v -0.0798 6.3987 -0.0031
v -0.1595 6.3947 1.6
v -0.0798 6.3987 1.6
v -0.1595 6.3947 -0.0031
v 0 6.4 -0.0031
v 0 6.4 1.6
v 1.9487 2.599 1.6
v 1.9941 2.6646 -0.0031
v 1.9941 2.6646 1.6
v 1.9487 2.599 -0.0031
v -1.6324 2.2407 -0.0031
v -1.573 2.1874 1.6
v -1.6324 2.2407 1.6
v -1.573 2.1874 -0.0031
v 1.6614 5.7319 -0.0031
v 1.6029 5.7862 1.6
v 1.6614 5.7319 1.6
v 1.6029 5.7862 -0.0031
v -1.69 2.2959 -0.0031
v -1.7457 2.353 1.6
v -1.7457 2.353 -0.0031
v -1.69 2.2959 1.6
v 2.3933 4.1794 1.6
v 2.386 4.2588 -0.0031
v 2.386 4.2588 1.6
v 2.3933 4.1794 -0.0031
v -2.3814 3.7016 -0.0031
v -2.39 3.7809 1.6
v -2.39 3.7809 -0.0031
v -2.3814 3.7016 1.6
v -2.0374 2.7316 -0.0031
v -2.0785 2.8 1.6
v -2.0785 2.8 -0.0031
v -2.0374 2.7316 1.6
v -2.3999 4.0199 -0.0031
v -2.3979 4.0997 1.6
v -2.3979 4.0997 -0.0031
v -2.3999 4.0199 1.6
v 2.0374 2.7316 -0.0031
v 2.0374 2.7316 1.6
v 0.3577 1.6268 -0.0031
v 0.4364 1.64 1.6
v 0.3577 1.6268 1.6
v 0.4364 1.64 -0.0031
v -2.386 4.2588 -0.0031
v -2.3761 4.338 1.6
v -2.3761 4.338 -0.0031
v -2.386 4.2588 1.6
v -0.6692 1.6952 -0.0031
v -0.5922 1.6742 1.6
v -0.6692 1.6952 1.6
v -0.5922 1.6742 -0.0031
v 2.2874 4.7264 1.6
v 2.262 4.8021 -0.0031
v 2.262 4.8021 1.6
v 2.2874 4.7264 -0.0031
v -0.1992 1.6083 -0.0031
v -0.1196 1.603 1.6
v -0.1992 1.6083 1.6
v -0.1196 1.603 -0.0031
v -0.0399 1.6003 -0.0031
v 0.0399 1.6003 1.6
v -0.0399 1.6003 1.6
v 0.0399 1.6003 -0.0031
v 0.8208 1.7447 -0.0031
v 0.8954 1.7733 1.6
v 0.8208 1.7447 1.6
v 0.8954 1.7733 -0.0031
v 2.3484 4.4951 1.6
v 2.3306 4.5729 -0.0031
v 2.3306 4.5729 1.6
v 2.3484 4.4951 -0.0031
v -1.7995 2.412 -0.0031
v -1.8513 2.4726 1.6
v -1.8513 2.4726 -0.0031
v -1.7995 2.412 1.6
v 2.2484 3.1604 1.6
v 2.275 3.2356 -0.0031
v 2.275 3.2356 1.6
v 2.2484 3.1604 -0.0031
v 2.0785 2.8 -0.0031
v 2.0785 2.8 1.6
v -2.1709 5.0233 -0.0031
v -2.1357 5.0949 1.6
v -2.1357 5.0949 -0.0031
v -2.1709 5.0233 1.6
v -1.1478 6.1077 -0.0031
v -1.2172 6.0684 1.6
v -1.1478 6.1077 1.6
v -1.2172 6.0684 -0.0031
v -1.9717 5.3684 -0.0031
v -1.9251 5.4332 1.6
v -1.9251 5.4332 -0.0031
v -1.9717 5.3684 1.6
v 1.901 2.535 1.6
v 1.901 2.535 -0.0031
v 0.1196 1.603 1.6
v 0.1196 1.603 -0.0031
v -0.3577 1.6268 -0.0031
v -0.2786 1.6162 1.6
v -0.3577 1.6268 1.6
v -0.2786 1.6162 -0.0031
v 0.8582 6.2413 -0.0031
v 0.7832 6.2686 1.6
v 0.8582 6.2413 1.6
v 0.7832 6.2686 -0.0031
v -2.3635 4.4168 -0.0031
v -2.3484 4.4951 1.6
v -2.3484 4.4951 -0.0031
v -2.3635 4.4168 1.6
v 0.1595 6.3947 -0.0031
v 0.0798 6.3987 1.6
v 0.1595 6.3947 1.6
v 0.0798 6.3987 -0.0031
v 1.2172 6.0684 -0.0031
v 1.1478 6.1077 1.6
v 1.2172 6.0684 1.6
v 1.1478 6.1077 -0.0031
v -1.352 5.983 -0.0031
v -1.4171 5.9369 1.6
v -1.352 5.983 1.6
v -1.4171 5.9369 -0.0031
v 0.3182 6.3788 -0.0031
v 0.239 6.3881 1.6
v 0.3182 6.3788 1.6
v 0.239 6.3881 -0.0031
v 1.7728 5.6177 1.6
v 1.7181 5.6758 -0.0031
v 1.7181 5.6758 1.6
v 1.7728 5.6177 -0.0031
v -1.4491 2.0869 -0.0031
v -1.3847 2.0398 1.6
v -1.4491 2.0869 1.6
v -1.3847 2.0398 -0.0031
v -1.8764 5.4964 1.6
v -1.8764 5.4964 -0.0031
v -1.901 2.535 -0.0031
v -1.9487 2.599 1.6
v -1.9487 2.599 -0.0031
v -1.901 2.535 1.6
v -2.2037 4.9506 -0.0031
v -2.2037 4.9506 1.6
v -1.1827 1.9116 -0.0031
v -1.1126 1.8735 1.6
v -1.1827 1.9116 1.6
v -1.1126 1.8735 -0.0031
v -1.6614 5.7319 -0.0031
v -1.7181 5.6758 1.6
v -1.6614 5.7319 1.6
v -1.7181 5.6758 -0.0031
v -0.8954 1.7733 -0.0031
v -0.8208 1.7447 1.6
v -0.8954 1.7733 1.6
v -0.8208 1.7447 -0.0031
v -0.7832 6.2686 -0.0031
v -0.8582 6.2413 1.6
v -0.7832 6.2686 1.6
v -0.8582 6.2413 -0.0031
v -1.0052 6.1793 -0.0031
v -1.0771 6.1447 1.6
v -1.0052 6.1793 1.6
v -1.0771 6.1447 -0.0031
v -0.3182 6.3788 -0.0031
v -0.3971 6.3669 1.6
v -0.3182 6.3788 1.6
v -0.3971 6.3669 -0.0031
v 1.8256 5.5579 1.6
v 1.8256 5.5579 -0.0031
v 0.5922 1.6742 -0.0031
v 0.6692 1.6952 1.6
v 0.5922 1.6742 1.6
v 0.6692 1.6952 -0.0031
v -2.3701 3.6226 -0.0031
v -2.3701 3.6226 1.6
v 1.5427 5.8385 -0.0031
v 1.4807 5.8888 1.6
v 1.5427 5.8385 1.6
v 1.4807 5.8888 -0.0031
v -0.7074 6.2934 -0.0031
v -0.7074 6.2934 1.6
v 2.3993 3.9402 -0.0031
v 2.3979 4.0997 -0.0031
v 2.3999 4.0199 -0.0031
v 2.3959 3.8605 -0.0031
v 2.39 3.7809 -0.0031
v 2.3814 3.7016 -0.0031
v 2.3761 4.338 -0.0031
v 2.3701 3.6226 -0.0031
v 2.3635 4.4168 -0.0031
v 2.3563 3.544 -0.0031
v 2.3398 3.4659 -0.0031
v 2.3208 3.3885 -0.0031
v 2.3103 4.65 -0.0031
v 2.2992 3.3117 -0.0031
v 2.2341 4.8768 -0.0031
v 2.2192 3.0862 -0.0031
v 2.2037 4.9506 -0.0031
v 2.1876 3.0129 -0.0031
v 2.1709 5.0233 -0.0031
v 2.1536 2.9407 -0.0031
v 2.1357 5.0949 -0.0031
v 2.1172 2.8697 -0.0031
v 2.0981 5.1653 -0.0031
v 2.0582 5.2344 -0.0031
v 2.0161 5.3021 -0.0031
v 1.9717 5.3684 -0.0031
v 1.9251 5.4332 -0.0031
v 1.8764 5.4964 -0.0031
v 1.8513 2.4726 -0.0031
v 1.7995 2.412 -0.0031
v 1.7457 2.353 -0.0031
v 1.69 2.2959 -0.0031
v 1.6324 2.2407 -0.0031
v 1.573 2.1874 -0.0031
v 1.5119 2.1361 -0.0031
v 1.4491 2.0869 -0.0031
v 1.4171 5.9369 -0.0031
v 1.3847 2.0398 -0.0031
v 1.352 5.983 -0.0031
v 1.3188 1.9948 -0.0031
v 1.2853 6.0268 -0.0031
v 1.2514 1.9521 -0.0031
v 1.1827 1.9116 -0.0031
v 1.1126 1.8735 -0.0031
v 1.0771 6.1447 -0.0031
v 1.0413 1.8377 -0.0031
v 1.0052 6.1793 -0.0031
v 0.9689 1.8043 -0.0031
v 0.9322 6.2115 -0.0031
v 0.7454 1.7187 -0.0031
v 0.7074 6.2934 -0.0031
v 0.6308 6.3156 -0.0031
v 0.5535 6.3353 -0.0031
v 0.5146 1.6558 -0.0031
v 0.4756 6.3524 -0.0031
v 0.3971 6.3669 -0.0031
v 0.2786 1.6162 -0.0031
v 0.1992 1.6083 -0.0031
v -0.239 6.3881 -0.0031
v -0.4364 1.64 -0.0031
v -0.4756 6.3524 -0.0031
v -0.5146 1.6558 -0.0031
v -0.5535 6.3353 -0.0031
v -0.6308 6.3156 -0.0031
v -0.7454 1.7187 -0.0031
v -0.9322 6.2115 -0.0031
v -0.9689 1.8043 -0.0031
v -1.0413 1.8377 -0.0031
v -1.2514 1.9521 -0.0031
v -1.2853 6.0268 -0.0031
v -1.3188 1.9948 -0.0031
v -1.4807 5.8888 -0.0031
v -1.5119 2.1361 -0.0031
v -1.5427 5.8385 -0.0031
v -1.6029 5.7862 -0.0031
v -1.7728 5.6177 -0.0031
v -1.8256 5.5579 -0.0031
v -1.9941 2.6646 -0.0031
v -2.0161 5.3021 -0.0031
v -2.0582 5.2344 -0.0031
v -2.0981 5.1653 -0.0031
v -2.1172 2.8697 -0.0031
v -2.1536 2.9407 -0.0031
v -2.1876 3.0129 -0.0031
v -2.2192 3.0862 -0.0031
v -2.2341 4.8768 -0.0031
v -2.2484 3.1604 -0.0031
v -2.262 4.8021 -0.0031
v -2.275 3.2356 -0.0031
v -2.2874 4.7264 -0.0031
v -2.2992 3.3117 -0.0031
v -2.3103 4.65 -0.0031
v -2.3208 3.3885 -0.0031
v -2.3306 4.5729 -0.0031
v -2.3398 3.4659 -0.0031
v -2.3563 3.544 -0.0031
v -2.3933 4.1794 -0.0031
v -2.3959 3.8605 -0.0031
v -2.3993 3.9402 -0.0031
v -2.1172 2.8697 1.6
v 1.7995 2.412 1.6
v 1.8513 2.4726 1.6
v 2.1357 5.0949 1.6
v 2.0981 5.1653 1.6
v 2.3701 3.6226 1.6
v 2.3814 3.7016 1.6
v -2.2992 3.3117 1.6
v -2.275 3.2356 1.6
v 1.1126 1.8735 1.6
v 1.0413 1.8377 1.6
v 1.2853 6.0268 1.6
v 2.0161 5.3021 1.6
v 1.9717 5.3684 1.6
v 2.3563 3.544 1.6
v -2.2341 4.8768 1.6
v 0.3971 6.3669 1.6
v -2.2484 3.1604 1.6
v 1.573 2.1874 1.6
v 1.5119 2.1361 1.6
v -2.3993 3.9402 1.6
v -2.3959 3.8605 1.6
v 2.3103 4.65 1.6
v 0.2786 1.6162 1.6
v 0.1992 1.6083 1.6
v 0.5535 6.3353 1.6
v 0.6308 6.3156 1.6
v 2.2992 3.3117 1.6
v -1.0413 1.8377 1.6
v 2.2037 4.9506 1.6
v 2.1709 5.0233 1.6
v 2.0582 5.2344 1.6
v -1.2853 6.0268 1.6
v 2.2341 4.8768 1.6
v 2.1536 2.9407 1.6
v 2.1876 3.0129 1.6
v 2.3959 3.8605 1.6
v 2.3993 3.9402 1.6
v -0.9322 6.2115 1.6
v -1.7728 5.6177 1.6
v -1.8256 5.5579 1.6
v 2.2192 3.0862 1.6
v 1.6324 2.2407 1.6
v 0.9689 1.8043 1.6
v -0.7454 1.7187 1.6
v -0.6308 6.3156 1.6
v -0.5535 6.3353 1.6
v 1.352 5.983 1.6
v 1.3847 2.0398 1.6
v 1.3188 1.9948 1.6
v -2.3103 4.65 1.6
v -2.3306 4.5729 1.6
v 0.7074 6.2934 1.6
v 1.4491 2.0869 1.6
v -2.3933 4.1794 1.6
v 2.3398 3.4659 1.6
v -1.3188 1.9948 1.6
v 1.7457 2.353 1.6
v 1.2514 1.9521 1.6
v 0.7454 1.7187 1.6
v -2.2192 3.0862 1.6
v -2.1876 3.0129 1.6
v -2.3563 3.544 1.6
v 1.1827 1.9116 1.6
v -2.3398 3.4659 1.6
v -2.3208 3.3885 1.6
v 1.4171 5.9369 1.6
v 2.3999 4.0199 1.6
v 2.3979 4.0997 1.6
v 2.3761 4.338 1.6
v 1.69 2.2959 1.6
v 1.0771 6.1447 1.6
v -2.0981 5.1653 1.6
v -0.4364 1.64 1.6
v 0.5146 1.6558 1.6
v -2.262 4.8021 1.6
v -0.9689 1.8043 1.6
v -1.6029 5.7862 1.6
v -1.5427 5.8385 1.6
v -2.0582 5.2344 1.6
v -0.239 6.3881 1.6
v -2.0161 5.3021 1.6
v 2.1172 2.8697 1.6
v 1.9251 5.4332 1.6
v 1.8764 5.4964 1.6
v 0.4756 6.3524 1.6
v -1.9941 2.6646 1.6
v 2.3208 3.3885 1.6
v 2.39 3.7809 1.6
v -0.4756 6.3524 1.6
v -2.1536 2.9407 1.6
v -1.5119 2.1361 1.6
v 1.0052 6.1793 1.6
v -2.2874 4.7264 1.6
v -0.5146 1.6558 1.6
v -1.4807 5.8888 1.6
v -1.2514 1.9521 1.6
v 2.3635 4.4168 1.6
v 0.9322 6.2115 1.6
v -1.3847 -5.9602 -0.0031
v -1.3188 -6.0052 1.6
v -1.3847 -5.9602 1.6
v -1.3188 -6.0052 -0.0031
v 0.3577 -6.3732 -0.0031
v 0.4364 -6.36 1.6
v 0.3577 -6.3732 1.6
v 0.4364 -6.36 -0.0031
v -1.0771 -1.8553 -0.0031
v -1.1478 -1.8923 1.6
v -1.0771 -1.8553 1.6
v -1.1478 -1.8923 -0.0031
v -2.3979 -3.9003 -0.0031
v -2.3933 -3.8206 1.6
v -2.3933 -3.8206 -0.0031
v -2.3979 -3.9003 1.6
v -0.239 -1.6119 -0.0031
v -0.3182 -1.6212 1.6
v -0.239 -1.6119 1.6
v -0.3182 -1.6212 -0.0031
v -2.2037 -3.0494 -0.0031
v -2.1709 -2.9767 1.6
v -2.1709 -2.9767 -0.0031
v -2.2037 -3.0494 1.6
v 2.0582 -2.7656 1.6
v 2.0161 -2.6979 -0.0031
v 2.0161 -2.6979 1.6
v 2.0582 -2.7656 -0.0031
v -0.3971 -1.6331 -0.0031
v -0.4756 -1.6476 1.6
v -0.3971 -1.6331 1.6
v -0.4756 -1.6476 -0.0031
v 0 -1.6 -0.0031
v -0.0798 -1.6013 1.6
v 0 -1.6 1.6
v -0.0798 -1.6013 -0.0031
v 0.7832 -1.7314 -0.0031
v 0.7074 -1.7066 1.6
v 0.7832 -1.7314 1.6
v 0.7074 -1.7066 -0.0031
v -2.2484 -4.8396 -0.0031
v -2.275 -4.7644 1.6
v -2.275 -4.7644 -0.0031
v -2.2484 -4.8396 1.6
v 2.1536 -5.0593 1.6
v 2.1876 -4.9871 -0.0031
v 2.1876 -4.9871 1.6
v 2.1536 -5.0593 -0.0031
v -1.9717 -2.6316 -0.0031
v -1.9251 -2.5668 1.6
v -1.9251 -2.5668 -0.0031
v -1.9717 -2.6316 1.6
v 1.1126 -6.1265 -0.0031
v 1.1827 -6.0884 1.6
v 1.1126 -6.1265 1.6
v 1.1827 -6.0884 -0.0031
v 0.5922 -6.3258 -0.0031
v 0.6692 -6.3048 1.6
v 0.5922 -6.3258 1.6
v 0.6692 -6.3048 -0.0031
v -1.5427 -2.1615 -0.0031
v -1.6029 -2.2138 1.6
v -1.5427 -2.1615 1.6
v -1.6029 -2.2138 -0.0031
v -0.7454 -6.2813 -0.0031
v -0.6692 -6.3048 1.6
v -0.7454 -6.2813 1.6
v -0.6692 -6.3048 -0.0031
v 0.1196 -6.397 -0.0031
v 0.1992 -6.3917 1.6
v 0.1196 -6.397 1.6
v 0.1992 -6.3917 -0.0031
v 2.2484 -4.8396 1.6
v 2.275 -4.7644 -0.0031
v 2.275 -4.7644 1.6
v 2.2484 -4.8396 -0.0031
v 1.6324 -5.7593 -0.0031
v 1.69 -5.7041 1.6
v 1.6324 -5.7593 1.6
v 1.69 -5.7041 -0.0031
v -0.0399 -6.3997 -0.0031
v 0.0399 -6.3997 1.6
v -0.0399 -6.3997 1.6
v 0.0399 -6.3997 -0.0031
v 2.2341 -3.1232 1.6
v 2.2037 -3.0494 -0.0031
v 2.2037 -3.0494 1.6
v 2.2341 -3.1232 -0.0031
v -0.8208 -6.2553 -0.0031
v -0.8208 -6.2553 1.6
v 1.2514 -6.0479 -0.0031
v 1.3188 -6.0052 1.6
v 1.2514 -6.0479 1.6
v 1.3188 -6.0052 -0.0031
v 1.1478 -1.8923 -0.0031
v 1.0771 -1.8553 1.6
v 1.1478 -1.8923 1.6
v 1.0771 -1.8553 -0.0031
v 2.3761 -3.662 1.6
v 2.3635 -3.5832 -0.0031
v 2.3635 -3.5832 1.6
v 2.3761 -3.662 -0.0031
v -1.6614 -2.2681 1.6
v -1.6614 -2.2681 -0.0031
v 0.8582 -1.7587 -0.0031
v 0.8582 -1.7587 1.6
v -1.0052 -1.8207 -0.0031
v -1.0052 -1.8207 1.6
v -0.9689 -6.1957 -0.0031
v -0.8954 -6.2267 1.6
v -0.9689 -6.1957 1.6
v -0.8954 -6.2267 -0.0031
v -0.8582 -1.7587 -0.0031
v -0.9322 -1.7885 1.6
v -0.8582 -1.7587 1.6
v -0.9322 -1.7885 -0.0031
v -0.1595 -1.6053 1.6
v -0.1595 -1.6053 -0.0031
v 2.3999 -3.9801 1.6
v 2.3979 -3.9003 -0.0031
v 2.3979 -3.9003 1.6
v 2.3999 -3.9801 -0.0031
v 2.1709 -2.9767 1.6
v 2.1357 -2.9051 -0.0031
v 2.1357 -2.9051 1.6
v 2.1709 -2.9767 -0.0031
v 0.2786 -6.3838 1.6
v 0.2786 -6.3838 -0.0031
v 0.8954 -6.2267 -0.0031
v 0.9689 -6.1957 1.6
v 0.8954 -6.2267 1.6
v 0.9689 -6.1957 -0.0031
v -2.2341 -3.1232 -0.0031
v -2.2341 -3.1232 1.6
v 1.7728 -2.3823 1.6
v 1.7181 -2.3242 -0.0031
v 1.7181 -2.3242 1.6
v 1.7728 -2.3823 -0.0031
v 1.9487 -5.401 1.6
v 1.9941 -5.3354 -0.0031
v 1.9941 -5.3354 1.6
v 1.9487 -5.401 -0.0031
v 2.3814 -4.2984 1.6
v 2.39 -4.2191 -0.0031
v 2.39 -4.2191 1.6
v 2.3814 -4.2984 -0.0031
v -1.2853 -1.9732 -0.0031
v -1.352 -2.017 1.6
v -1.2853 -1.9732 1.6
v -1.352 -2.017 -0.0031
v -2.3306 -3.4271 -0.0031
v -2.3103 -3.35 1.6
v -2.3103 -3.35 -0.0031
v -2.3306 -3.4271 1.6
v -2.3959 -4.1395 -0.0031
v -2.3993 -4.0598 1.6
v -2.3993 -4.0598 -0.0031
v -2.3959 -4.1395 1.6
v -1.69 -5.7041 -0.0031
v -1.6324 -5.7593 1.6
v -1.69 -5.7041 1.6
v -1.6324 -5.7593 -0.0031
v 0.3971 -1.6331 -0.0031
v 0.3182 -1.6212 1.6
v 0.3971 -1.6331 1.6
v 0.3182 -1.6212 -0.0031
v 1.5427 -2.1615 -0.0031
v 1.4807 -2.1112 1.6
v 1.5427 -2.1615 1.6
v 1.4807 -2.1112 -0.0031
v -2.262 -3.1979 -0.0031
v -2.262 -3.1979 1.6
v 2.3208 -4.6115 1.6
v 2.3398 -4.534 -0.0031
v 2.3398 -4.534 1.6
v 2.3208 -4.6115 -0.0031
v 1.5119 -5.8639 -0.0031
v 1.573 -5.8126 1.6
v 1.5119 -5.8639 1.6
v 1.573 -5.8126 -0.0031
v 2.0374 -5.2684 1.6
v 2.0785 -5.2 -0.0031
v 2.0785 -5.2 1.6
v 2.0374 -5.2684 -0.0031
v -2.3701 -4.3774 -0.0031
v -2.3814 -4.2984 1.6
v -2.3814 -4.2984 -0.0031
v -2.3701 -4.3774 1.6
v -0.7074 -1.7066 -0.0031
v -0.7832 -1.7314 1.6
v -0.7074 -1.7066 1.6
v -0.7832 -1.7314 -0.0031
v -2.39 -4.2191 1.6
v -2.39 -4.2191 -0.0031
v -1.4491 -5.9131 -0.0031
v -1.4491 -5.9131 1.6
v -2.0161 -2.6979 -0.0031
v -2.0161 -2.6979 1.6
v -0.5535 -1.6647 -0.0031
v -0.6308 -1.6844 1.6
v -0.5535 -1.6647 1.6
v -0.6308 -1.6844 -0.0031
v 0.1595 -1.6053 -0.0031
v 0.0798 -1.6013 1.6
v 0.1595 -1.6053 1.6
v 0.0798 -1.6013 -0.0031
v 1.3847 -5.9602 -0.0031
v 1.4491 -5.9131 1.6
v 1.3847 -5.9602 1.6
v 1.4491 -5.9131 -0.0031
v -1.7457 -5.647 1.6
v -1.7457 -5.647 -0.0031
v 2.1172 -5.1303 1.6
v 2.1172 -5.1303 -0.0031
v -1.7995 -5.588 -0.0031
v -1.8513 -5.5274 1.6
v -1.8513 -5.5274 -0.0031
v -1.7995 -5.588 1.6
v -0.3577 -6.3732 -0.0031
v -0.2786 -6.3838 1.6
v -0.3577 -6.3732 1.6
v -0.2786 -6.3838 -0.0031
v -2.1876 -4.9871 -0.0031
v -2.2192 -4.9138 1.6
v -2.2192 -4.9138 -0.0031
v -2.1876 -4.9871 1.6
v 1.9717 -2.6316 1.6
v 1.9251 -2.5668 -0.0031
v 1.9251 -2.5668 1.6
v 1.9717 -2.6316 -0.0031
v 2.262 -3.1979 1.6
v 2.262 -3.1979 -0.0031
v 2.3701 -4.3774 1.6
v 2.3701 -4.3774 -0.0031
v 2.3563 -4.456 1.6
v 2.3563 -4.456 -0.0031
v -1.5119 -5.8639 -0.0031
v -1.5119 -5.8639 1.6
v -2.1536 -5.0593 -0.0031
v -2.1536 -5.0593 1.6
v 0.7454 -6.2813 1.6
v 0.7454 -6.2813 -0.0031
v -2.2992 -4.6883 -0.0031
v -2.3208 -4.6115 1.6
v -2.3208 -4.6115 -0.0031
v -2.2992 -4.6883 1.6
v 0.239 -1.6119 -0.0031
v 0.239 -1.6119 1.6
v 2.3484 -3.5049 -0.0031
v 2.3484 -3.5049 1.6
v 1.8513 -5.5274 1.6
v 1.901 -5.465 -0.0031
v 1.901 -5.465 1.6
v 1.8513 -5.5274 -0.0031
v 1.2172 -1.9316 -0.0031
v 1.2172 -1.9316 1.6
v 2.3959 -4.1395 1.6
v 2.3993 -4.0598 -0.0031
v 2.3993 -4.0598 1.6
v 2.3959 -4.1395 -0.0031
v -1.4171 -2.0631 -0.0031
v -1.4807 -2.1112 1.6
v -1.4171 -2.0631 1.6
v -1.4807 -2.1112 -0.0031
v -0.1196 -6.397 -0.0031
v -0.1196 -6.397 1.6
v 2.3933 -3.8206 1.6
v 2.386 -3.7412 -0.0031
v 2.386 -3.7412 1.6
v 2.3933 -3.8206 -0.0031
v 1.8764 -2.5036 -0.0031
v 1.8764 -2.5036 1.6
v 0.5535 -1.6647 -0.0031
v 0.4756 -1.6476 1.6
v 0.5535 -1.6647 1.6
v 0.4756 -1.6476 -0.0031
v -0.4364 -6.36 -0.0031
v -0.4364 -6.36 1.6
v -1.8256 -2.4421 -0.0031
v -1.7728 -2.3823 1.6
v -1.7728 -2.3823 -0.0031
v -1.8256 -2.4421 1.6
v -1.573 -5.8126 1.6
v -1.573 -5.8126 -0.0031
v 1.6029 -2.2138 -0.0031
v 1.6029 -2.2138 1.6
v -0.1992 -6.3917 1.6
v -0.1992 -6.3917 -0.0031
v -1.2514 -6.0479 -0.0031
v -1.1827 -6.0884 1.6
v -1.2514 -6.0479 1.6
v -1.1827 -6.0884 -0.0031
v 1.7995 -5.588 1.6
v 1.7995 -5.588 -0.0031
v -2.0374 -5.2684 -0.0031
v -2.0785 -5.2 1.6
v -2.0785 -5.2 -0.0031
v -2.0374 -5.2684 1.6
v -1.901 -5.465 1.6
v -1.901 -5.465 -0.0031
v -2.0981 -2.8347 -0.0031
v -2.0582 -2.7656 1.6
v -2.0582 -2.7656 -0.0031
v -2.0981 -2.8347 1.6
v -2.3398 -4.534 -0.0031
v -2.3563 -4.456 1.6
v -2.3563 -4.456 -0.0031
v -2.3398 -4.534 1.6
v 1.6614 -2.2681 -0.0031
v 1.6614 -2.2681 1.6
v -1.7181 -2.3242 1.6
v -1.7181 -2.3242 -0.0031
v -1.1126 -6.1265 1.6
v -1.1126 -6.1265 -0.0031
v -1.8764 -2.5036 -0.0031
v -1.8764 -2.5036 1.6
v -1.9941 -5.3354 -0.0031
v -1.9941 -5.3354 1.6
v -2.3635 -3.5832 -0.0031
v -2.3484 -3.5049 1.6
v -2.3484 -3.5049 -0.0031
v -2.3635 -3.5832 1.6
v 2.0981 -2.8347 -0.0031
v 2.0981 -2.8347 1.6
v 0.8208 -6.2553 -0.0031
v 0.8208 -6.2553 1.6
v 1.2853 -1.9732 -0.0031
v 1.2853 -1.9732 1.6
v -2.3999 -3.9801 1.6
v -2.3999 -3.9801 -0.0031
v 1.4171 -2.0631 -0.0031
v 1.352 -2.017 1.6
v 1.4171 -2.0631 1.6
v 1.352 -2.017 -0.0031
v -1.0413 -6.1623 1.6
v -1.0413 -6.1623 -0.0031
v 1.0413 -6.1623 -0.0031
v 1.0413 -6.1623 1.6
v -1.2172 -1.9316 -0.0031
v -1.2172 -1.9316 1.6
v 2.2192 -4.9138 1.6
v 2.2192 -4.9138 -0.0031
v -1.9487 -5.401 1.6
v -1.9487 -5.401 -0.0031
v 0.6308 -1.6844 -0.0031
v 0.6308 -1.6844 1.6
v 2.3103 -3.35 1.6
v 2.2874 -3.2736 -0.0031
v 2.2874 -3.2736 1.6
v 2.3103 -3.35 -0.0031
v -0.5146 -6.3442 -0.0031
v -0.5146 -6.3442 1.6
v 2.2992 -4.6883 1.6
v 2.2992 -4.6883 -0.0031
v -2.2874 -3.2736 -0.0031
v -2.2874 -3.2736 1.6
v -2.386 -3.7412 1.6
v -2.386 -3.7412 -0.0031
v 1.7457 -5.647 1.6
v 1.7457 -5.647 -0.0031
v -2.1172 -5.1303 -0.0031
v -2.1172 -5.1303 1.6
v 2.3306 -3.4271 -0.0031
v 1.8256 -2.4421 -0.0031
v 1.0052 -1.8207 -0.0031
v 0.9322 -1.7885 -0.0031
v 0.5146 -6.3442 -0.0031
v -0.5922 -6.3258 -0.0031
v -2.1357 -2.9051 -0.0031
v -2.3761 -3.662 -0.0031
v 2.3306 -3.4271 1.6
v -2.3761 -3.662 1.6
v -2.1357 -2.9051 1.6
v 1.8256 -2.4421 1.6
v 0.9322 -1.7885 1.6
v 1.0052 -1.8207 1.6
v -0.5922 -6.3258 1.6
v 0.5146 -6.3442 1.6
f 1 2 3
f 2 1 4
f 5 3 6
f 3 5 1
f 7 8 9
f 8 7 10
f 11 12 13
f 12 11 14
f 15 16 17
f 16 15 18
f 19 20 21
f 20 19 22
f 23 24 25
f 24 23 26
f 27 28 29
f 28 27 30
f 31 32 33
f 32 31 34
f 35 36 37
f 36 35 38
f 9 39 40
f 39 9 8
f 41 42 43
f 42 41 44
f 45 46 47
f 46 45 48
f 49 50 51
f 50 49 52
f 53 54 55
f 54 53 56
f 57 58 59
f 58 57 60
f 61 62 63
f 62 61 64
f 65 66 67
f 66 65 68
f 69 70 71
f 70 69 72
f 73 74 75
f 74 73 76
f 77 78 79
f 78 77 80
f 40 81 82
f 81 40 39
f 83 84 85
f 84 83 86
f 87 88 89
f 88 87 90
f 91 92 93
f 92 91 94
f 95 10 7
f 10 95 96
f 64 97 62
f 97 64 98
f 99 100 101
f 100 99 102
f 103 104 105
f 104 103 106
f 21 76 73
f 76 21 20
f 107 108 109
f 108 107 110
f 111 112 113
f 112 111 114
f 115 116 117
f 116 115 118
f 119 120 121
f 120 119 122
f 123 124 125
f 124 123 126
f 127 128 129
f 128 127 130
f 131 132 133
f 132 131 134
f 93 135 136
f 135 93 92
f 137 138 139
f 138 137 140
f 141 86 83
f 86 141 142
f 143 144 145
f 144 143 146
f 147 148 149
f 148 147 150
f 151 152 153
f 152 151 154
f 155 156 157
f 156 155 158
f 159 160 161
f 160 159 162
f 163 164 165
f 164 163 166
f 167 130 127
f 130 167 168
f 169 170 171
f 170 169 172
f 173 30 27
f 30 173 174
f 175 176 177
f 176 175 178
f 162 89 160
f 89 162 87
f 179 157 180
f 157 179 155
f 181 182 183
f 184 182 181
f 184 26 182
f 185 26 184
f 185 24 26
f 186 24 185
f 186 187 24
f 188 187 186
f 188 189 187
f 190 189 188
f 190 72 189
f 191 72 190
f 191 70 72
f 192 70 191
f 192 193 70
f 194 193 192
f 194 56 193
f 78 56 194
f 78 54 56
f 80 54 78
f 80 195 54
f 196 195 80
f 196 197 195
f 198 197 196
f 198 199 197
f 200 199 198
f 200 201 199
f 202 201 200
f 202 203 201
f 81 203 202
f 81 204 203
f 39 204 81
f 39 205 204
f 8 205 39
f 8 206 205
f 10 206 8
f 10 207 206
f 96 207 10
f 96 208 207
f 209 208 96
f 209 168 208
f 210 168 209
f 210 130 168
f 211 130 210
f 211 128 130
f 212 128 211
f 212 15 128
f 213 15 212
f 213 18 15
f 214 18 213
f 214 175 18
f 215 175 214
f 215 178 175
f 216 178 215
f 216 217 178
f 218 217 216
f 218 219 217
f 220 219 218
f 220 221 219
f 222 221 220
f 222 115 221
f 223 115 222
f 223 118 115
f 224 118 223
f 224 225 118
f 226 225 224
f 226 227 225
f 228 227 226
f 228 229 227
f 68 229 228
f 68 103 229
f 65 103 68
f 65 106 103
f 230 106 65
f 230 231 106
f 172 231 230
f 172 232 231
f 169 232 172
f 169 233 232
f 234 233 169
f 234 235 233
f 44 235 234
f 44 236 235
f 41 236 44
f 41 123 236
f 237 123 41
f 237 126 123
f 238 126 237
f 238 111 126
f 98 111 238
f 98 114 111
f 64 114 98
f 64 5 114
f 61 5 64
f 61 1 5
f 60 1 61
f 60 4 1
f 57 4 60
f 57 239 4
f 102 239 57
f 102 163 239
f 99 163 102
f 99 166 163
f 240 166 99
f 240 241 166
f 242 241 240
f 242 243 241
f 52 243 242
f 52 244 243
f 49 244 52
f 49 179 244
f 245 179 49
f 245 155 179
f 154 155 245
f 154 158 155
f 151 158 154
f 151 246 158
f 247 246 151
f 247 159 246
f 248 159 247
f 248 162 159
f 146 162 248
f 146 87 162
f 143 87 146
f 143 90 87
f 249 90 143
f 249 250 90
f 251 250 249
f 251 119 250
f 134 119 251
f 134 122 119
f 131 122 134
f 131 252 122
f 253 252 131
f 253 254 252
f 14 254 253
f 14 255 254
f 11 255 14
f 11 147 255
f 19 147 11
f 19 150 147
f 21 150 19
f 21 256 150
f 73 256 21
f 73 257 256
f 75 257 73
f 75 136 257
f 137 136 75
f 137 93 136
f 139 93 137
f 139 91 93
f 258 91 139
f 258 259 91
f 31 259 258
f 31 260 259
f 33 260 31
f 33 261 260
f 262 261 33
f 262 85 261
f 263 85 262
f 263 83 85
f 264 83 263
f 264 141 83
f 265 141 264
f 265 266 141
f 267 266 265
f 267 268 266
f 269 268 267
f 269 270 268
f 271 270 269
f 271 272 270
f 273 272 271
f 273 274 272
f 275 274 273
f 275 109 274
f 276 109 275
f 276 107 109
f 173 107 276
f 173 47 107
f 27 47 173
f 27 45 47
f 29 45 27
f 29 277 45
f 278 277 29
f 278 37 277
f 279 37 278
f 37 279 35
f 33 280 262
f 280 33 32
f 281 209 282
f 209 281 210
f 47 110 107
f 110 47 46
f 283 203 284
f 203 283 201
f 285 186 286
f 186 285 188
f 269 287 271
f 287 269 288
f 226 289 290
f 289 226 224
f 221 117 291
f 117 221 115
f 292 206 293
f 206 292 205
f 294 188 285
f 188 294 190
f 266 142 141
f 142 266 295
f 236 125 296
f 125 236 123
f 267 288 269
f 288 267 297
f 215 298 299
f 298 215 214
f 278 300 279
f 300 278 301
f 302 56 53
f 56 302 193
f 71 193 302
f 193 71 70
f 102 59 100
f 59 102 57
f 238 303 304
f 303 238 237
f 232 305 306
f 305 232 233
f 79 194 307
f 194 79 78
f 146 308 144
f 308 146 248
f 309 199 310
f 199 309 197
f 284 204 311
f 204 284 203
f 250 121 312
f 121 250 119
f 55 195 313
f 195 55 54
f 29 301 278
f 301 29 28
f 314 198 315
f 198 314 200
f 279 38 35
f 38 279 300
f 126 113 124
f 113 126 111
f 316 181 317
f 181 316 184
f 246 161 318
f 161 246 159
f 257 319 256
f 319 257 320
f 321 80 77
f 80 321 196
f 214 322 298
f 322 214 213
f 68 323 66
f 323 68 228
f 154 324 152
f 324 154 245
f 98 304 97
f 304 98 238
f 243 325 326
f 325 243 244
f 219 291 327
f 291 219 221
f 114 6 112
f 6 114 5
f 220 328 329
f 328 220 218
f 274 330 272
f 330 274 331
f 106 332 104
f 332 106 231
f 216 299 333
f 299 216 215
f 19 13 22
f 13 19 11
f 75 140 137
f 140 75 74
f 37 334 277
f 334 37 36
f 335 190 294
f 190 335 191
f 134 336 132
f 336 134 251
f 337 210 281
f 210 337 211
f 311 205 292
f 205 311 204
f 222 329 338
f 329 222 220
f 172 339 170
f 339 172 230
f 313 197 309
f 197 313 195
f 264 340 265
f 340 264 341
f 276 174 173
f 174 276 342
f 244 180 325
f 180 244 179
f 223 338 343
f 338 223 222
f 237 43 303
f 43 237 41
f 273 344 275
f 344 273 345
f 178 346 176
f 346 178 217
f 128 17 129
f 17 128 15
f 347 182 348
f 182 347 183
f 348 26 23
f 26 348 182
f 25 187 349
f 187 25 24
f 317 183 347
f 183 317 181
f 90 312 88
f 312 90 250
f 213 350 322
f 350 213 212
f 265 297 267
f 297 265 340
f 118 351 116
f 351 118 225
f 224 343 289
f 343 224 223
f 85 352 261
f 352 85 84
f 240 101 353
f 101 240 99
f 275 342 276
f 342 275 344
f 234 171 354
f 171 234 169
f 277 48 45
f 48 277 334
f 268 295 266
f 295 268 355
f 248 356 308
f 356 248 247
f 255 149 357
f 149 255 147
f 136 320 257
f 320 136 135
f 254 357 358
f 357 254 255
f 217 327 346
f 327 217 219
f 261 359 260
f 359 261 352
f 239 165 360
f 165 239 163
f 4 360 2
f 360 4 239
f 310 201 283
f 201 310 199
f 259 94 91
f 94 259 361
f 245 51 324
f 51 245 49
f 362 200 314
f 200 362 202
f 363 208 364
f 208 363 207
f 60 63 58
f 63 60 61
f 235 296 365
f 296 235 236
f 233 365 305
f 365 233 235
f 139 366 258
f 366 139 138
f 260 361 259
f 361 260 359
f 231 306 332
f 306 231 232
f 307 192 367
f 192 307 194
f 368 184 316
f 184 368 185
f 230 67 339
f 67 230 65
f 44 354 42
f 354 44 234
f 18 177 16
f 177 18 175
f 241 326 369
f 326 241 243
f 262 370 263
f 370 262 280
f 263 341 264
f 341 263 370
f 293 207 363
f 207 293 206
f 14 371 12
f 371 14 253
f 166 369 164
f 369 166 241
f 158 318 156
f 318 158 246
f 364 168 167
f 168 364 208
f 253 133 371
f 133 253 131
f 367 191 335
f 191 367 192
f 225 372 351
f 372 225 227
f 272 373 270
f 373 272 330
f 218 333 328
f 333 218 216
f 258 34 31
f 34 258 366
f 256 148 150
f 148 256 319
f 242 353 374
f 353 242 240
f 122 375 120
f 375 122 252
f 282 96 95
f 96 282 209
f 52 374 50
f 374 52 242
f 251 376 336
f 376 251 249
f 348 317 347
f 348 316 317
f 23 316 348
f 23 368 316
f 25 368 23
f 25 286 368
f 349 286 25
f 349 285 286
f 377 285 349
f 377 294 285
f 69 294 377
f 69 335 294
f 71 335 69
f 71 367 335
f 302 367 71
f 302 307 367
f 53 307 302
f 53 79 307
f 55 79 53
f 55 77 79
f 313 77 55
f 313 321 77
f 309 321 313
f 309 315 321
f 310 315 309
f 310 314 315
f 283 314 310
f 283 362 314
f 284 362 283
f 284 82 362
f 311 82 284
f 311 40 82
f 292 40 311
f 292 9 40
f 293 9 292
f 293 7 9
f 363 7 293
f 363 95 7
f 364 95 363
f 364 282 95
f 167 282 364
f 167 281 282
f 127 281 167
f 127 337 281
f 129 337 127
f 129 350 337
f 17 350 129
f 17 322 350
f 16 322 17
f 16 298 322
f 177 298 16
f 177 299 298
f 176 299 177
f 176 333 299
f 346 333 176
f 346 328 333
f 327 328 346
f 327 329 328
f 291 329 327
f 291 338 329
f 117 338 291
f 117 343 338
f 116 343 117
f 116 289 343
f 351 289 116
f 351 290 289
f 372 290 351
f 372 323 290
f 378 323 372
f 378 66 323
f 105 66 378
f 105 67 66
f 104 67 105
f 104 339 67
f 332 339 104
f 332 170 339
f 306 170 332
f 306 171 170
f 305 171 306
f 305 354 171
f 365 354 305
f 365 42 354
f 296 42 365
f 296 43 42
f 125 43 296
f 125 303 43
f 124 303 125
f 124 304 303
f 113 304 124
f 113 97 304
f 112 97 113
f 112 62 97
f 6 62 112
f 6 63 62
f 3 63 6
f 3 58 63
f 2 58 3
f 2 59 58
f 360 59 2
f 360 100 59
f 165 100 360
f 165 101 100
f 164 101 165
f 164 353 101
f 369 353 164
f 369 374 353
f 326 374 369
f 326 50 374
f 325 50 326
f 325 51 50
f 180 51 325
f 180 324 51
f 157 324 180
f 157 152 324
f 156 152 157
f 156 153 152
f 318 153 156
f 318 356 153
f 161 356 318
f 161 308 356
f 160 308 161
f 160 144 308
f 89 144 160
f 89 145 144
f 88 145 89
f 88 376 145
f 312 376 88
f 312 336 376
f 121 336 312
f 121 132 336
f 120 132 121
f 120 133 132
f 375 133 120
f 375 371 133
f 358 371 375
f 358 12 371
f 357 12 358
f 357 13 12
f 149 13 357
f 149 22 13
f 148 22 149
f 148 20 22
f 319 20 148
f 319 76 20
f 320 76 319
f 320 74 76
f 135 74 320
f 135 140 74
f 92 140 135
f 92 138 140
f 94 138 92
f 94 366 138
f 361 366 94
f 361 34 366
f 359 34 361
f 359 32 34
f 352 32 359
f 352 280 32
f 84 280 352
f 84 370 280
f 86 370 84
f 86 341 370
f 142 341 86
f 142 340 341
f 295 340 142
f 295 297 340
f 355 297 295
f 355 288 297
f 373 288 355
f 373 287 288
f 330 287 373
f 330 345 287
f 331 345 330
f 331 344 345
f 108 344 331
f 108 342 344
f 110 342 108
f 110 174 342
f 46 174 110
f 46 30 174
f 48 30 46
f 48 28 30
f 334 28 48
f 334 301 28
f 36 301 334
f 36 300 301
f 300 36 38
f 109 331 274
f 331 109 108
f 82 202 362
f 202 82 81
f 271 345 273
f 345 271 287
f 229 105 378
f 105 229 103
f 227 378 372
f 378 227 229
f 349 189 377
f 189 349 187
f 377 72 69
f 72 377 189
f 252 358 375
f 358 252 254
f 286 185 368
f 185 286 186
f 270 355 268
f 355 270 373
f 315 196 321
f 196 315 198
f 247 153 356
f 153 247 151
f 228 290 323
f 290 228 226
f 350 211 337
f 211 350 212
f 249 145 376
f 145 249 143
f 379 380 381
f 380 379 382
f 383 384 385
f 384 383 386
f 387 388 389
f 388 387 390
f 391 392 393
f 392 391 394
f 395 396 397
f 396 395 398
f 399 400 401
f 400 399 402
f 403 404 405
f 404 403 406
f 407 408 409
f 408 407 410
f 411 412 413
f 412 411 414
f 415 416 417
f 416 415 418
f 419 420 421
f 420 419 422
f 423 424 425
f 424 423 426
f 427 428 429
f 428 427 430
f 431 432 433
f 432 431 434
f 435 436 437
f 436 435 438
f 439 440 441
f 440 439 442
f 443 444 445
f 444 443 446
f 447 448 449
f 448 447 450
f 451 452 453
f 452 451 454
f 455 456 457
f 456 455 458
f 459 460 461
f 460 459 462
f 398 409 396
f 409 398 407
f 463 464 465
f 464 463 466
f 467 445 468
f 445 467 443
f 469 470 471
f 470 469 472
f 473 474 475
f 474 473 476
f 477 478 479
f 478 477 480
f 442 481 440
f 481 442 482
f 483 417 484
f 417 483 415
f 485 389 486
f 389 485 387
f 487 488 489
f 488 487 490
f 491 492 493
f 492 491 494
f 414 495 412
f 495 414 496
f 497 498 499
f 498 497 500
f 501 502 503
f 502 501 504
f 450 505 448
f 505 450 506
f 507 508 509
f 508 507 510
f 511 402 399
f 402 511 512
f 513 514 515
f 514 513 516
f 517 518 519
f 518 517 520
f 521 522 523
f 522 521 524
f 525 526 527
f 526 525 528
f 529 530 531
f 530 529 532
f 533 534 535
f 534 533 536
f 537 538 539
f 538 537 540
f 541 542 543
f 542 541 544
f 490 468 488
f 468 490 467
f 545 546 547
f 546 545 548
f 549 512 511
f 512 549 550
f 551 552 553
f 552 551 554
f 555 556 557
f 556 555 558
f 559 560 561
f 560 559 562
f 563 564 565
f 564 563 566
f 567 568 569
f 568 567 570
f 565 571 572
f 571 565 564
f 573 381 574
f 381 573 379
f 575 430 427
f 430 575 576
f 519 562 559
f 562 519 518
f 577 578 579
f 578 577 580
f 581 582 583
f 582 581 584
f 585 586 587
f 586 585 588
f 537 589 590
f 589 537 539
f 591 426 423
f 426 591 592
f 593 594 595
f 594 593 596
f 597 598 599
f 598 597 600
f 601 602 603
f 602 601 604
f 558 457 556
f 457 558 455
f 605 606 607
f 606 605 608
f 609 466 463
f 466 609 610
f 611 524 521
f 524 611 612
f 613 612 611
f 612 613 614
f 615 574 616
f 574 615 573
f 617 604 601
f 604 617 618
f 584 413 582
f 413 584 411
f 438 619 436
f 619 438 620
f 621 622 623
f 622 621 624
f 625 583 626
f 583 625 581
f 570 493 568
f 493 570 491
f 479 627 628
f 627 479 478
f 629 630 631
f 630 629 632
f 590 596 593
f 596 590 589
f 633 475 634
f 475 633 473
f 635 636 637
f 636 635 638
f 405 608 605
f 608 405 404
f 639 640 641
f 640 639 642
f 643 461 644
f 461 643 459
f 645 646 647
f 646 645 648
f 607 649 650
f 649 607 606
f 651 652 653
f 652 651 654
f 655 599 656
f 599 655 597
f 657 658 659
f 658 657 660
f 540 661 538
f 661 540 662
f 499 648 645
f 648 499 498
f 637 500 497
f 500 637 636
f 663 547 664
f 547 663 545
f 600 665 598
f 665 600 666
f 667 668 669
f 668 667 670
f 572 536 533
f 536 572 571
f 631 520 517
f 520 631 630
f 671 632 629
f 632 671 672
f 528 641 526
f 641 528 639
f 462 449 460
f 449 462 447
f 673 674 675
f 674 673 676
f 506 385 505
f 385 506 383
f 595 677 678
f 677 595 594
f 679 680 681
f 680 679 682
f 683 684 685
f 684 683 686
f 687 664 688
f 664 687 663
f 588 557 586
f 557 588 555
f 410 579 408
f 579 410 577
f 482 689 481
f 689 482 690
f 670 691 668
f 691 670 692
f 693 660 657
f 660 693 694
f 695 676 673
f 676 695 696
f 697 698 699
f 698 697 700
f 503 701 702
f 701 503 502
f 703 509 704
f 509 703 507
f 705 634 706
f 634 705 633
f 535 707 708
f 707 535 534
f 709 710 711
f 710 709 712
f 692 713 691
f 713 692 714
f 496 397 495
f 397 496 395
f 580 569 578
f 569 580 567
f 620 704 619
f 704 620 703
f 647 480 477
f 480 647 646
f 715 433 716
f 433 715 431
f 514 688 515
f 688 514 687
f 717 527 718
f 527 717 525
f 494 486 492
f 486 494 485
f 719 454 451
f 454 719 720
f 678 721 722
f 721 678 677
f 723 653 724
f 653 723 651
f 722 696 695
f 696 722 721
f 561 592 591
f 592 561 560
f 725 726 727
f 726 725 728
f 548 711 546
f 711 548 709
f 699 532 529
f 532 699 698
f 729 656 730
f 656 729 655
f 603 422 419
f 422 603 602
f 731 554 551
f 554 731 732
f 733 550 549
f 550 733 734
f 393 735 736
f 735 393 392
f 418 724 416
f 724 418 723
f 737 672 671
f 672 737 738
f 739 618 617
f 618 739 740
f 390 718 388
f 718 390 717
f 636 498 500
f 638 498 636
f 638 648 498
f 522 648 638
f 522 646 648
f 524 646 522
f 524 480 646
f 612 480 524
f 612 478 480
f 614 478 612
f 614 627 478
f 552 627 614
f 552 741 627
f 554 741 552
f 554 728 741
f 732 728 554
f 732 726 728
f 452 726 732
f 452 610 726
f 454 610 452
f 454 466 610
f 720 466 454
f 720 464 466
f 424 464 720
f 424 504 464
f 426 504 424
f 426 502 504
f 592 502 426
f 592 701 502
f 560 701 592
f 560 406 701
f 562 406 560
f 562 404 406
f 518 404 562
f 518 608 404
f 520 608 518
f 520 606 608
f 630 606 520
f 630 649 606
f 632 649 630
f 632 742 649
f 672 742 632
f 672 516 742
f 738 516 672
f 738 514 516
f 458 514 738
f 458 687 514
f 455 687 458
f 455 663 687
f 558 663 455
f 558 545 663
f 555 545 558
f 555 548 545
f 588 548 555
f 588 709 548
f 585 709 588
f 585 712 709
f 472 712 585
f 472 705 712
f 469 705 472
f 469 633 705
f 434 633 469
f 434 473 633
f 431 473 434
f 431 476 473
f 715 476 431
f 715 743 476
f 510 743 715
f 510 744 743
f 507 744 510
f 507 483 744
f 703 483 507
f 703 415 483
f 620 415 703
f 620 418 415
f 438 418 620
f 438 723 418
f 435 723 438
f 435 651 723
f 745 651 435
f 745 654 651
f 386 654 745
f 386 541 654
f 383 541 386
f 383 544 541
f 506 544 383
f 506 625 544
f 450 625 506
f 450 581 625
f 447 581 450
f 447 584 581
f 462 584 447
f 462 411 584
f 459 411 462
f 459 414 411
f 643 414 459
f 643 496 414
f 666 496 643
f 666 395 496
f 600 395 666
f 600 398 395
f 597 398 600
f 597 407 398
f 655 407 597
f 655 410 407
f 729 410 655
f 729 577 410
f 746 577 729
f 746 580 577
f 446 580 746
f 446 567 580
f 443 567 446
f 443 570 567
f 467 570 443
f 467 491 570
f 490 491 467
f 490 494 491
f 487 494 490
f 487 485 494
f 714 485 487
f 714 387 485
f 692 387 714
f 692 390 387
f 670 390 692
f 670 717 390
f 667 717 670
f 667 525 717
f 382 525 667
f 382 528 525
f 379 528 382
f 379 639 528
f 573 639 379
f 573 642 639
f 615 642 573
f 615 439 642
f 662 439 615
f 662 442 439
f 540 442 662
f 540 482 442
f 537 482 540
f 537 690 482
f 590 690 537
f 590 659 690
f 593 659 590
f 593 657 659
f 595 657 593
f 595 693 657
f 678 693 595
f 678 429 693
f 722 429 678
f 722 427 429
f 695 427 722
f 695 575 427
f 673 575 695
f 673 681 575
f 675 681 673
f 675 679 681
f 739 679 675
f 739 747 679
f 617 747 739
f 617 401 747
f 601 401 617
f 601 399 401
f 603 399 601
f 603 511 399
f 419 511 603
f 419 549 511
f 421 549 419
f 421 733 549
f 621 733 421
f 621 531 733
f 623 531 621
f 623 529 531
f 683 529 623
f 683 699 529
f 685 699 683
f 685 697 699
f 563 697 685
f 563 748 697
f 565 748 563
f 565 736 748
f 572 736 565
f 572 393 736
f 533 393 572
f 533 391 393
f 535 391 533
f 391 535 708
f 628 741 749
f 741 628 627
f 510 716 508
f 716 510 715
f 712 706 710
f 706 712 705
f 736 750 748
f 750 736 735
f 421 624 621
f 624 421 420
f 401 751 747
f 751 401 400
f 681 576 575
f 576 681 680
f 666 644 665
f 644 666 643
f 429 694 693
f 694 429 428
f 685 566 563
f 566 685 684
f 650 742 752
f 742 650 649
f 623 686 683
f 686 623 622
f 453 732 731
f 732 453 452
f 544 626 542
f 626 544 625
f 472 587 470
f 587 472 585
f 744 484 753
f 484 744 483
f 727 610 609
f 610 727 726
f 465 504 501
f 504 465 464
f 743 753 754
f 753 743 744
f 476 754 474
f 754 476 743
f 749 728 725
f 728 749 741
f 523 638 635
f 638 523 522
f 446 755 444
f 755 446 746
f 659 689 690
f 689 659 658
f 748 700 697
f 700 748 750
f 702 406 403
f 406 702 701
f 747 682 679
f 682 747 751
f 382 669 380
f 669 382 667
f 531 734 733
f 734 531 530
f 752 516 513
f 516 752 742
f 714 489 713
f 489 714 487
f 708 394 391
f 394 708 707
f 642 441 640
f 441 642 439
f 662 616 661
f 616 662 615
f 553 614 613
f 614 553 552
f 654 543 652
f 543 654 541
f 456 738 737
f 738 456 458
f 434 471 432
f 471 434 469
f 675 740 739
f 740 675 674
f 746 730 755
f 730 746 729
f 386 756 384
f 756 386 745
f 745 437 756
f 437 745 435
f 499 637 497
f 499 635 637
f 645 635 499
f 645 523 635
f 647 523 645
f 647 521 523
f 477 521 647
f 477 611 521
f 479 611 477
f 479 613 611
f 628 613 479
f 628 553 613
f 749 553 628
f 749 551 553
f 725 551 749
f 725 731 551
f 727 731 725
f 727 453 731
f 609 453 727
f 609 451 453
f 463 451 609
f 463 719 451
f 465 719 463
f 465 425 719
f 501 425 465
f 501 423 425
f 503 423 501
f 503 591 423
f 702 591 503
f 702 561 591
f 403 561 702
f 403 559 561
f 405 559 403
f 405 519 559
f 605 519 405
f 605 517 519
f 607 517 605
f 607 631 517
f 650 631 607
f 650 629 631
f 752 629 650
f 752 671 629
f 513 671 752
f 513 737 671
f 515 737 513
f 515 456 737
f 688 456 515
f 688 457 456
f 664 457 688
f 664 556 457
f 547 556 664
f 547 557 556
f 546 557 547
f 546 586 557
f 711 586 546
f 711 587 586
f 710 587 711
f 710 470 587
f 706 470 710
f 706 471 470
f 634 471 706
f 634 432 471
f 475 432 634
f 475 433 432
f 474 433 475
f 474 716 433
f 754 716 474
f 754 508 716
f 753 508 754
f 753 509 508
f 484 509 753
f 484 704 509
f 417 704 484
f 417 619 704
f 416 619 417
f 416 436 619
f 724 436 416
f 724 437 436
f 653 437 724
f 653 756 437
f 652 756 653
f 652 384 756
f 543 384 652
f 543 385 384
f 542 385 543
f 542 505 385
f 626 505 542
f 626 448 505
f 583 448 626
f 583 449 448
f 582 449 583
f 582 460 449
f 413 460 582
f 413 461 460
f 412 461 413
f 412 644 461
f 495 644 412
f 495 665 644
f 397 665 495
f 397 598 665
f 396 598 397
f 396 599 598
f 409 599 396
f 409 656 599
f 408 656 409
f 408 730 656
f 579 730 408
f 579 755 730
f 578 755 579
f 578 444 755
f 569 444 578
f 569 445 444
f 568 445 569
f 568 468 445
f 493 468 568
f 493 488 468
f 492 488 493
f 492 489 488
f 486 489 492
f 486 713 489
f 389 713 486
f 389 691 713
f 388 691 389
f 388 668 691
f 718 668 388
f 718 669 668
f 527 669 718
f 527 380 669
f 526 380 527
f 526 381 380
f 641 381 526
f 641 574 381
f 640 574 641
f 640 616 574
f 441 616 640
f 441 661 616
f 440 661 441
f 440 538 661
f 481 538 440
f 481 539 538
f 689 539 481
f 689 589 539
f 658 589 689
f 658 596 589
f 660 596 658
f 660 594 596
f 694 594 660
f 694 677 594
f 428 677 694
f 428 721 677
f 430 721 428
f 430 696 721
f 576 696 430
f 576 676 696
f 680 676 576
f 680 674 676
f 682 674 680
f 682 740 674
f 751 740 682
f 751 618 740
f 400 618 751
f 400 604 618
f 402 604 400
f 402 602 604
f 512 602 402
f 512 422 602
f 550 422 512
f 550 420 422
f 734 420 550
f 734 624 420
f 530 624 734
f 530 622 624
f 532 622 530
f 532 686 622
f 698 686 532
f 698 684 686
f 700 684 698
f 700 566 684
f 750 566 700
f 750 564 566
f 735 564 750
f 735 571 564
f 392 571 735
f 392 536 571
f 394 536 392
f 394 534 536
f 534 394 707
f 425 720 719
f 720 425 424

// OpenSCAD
use <../lib.scad>
use <50967.scad>
$fa=1; $fs=0.2;
function ldraw_lib__4247772(realsolid=false) = [
// 0 ~_Slope Brick Curved  8 x  1 x  1.667 with Arch Red (Obsolete)
// 0 Name: 4247772.dat
// 0 Author: [PTadmin]
// 0 !LDRAW_ORG Part Physical_Colour UPDATE 2019-02
// 0 !LICENSE Licensed under CC BY 2.0 and CC BY 4.0 : see CAreadme.txt
// 
// 0 BFC CERTIFY CCW
  [0,"BFC","CERTIFY"],
  [0,"BFC","CCW"],
// 
// 0 !HISTORY 2010-12-31 [PTadmin] Official Update 2010-03
// 0 !HISTORY 2019-08-20 [Holly-Wood] Obsoleted per decision not to include physical colour parts
// 0 !HISTORY 2019-09-09 [PTadmin] Official Update 2019-02
// 
// 
// 0 // This file is a "shortcut" with the correct number for the actual
// 0 // colouring of the part (Red).
// 
// 1 4 0 0 0 1 0 0 0 1 0 0 0 1 50967.dat
  [1,4,0,0,0,1,0,0,0,1,0,0,0,1, ldraw_lib__50967(realsolid)],
];
module ldraw_lib__4247772(step=0, col=false, unit=2/5, alt=false, line=0.2, solid=!$preview)
    makepoly(ldraw_lib__4247772(solid), step=step, col=col, unit=unit, alt=alt, line=line, solid=solid);
ldraw_lib__4247772(line=0.2);
